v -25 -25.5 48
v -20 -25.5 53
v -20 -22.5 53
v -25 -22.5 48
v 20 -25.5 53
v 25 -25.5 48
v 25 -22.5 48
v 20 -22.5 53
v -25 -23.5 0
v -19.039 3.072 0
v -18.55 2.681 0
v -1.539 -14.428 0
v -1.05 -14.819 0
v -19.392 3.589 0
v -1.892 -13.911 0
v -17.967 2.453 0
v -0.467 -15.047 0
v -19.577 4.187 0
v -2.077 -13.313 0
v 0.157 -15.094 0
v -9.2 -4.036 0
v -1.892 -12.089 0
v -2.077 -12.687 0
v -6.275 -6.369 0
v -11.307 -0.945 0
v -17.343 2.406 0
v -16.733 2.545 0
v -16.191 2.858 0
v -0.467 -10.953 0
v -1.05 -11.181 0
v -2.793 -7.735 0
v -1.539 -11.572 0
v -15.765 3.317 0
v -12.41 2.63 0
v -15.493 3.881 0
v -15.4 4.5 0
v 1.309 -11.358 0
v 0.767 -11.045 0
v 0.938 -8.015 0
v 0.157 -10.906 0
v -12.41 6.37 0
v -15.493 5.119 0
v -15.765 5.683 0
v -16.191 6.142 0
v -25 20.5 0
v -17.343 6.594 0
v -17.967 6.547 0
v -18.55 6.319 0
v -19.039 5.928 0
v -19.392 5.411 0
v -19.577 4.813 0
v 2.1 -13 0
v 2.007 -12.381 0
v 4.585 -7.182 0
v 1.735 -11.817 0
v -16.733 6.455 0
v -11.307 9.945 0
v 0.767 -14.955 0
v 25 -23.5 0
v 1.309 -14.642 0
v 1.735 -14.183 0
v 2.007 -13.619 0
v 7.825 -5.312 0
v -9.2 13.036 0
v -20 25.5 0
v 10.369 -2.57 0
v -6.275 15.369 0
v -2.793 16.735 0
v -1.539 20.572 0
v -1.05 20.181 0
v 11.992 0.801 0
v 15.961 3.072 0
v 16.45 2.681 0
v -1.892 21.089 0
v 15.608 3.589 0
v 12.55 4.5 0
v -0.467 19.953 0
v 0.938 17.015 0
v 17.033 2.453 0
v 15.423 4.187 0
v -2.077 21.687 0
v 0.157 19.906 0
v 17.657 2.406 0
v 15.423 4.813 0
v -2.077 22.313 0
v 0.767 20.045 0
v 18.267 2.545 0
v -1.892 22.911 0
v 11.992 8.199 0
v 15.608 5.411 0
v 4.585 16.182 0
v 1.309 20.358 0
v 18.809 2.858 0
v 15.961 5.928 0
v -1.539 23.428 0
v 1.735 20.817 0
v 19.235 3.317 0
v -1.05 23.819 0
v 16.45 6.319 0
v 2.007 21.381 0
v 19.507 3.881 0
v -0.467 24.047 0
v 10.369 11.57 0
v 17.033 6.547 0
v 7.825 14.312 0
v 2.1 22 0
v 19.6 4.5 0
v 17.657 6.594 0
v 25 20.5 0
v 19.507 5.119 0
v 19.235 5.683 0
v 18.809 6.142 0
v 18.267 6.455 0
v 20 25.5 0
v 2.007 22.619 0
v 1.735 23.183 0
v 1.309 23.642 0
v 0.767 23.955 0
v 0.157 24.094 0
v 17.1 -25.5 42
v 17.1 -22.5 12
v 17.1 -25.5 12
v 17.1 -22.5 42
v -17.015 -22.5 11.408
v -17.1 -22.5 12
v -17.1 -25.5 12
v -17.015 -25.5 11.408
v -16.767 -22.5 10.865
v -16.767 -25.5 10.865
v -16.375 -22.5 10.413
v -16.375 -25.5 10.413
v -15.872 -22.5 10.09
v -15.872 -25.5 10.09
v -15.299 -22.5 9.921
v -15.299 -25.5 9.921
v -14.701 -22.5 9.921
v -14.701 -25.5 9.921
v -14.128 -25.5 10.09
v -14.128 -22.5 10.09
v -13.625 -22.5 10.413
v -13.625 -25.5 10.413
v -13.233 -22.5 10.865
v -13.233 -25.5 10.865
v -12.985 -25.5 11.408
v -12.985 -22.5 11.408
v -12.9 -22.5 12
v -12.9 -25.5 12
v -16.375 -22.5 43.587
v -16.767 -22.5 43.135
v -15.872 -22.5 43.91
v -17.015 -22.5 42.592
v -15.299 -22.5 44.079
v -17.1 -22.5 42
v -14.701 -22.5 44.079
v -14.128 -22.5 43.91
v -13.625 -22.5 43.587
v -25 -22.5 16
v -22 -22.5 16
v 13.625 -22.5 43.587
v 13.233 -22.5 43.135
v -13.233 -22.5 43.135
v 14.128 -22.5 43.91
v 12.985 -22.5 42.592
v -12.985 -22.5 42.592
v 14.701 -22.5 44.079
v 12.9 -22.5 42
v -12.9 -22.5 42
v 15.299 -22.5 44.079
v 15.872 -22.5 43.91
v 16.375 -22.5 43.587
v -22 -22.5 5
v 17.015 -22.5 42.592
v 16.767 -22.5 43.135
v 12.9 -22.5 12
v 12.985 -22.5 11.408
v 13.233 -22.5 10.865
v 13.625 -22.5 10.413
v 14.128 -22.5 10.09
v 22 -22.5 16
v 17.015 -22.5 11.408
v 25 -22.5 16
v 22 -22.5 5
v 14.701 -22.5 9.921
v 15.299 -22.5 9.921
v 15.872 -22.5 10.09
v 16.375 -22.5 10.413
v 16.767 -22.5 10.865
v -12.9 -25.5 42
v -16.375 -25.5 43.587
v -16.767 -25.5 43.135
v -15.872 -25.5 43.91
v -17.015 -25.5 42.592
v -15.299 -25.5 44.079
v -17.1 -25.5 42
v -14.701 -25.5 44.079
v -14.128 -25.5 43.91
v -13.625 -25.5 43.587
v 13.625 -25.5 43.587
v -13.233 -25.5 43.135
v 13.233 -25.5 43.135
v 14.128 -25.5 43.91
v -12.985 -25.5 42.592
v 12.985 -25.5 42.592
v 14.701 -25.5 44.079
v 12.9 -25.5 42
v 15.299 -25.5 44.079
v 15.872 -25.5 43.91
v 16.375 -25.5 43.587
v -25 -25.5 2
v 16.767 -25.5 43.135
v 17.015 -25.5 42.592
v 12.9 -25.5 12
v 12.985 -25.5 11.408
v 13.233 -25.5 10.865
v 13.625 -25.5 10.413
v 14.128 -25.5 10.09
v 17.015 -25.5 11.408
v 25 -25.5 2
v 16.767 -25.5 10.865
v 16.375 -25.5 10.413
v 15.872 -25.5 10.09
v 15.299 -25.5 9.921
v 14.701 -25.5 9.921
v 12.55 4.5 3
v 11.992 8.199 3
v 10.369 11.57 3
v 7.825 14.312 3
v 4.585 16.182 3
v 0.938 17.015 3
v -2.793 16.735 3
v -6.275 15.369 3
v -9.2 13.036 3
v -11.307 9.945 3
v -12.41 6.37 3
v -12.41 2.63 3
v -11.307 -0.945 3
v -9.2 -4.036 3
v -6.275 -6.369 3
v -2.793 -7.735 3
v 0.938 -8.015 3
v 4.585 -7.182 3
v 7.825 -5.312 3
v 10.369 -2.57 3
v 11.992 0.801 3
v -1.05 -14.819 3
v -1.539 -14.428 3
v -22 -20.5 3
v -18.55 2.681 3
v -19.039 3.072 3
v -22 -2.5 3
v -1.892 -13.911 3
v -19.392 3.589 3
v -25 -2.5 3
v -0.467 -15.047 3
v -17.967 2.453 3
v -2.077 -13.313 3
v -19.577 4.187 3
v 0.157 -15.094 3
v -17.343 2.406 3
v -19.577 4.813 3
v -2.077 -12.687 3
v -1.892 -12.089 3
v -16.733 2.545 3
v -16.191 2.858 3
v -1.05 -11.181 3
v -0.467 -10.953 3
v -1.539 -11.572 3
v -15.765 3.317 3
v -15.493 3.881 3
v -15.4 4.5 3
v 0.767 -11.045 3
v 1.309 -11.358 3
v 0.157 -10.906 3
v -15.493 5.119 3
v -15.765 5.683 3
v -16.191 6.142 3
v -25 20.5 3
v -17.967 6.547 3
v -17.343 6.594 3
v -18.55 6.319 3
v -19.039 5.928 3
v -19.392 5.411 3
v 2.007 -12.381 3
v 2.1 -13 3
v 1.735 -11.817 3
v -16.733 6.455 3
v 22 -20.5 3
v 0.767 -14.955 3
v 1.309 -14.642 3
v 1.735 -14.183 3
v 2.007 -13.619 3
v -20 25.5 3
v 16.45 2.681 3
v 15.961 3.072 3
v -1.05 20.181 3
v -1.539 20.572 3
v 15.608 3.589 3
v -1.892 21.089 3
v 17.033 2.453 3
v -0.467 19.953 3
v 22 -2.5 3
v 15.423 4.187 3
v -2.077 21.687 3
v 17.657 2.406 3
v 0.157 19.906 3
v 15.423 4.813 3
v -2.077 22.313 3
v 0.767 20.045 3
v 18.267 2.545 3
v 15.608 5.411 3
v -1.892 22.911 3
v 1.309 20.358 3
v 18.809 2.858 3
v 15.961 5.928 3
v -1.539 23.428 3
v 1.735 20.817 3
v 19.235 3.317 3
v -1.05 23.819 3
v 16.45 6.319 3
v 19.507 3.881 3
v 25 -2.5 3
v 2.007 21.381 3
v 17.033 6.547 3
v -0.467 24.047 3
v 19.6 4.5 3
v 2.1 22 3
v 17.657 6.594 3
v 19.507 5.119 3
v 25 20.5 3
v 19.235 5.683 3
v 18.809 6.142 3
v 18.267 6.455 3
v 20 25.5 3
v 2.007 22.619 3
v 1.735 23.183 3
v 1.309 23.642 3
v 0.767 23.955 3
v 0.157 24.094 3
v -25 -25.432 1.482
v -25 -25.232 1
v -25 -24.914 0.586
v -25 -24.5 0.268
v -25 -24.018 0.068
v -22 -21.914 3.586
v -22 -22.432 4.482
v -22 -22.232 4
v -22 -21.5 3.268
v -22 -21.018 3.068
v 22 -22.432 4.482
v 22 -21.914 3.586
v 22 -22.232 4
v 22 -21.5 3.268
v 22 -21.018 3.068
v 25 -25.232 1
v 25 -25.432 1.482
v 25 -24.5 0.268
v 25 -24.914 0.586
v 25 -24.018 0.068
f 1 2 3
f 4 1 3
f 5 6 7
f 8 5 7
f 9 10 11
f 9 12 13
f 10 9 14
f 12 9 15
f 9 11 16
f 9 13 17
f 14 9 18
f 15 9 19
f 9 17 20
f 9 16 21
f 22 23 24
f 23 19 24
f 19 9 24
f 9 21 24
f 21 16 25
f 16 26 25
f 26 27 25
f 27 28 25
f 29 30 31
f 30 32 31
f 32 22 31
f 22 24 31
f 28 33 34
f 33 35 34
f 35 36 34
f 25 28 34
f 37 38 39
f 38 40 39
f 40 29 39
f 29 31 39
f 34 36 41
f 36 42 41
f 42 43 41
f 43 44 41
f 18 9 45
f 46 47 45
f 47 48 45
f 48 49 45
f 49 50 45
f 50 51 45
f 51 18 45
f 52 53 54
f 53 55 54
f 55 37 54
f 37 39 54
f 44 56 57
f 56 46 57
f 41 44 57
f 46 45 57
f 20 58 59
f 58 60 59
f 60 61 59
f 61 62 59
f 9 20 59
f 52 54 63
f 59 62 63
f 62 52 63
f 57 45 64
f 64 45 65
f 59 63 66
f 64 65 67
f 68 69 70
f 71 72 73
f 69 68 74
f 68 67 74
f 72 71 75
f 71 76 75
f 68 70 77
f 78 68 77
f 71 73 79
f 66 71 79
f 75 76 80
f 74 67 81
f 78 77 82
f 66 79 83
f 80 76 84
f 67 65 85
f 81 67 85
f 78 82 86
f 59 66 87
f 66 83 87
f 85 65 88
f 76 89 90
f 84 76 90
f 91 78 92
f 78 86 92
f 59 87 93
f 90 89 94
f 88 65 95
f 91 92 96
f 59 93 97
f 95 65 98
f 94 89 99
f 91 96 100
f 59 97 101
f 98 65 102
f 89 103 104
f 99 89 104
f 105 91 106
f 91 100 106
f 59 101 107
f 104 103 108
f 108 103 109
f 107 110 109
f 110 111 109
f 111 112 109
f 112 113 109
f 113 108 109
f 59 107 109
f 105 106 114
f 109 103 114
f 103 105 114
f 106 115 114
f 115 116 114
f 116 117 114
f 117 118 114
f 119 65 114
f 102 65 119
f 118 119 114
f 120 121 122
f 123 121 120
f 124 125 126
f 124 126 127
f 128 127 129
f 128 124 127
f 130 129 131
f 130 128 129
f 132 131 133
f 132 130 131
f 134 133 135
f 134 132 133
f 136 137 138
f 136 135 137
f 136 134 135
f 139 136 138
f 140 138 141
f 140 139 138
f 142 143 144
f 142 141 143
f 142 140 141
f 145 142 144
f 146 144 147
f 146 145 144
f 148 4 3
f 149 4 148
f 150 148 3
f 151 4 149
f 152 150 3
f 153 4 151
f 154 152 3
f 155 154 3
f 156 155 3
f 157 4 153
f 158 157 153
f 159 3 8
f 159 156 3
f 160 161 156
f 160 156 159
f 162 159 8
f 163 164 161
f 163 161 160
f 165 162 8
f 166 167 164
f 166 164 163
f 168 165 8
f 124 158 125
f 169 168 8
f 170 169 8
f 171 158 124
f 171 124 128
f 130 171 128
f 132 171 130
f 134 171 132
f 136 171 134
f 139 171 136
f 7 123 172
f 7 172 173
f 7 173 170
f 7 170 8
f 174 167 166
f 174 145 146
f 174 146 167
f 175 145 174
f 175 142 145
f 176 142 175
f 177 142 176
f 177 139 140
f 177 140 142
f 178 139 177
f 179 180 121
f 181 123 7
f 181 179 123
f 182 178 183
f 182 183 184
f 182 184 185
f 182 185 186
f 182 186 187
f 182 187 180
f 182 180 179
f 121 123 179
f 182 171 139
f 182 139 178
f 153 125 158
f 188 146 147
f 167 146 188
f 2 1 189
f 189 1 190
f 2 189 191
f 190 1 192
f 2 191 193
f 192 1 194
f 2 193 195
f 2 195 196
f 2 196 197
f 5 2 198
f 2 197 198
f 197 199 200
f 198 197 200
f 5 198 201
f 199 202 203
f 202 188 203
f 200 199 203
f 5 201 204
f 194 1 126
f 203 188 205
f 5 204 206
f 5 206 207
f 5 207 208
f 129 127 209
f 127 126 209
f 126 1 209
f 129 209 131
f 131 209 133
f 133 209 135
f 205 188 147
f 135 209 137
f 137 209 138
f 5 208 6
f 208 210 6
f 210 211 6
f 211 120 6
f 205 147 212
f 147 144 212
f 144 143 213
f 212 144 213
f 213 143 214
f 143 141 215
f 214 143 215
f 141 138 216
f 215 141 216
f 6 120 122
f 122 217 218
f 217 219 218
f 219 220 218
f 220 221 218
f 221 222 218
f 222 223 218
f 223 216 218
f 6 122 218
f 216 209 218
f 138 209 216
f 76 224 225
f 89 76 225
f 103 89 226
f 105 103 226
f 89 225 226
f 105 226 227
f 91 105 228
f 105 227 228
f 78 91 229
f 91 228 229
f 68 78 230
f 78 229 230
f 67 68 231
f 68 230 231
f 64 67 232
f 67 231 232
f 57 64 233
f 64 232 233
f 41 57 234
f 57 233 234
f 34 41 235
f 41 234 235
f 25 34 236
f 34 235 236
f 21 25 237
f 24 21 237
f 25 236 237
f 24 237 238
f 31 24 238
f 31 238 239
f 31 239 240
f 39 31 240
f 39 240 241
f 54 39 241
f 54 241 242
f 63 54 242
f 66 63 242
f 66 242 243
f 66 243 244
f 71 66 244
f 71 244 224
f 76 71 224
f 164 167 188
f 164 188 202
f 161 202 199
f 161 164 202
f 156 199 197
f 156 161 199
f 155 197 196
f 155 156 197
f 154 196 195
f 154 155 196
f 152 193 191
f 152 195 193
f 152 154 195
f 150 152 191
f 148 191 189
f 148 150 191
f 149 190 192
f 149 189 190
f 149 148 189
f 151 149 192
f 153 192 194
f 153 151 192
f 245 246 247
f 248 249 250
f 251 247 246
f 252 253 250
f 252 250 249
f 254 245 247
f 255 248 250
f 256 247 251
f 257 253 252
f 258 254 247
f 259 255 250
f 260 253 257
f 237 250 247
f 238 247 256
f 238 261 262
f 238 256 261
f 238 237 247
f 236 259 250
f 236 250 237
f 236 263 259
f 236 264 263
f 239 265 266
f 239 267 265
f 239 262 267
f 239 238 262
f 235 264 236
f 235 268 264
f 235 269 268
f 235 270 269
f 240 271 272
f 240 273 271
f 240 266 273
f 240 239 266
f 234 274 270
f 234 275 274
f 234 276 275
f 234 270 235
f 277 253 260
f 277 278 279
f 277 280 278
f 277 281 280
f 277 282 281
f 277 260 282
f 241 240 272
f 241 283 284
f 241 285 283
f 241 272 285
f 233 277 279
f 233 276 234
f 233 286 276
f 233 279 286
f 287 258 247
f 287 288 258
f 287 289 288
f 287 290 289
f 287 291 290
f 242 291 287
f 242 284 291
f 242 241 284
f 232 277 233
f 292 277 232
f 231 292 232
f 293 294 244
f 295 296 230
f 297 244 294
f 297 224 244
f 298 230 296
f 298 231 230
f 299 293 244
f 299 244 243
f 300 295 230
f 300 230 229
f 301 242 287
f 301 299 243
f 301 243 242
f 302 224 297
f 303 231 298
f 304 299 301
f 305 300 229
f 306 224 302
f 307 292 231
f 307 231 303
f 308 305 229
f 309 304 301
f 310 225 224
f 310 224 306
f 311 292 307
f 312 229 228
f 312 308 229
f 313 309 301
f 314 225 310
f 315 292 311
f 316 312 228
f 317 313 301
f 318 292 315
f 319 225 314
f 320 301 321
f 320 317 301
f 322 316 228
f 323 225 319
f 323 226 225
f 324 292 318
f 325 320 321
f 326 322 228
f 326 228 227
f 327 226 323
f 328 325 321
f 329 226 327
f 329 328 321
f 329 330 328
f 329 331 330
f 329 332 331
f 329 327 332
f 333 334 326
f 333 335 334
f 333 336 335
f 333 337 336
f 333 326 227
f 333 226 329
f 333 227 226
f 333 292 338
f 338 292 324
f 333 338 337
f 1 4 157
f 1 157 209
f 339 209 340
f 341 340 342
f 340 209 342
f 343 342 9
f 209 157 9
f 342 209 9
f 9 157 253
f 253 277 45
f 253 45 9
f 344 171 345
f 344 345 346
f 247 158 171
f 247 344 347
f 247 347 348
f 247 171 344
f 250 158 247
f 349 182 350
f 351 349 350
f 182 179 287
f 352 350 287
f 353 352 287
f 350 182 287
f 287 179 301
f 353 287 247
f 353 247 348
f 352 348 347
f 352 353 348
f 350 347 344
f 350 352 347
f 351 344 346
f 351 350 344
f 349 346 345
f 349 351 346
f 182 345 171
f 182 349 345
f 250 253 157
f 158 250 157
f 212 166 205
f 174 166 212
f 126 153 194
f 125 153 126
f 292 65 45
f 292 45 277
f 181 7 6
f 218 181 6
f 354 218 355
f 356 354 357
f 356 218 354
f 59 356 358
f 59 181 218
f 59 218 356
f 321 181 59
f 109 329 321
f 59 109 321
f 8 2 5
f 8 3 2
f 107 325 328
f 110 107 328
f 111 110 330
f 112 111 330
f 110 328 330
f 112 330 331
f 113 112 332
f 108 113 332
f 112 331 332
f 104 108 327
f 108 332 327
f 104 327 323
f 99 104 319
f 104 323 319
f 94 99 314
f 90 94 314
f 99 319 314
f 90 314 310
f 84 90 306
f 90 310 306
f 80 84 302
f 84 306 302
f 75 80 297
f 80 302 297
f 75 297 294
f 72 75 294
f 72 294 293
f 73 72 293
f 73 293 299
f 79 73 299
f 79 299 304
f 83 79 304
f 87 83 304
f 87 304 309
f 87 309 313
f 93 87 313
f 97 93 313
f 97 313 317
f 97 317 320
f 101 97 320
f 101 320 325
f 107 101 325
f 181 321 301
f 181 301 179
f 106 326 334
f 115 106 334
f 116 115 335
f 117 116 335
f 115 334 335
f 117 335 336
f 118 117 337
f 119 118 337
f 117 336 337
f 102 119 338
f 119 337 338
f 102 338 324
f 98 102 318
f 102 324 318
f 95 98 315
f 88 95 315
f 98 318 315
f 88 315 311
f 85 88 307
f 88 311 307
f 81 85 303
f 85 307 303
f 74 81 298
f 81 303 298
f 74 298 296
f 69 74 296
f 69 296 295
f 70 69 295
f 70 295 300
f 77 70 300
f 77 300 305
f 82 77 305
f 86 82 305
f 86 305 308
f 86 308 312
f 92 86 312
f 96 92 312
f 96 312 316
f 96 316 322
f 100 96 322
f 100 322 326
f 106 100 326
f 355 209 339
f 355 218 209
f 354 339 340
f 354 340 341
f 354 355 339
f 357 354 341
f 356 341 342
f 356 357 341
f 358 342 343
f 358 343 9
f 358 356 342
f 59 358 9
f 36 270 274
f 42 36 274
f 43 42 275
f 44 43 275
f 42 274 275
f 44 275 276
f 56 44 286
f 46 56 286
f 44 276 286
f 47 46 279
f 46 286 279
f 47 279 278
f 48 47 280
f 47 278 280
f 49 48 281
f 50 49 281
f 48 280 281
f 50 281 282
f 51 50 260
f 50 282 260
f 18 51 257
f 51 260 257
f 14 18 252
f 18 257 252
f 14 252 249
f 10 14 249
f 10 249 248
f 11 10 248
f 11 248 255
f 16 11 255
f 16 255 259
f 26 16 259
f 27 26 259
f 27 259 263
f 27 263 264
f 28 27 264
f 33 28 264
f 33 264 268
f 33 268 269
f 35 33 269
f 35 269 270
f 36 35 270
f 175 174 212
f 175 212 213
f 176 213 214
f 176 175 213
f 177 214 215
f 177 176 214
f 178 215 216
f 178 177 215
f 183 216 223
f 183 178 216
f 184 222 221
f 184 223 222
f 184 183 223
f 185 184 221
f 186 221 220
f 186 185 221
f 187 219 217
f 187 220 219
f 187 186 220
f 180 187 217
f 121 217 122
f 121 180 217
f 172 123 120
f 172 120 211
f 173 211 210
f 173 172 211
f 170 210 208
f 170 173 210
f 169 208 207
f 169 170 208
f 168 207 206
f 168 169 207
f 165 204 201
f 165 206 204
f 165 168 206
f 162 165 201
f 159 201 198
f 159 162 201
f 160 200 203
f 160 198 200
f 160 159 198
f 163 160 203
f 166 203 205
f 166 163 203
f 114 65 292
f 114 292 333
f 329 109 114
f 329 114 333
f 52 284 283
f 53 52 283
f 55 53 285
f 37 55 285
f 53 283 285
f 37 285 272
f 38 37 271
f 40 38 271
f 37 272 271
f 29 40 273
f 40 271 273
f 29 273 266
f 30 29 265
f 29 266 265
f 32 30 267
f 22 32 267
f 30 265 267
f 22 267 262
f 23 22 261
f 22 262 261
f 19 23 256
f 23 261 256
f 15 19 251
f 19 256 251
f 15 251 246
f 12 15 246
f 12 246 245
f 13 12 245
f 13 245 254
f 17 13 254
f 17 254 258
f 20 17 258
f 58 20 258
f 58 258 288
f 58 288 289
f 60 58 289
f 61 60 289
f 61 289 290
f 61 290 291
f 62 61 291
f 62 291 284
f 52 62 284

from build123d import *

# Parameters (mm, degrees)
SKETCH1_W           = 50
SKETCH1_H           = 51
BOSS_EXTRUDE1_DEPTH = 3
SKETCH2_W           = 50
SKETCH2_H           = 3
BOSS_EXTRUDE2_DEPTH = 50
FILLET1_R           = 2
CHAMFER1_SIZE       = 5
CUT_EXTRUDE1_DEPTH  = 50
SKETCH4_R           = 12.55
SKETCH4_R_2         = 2.1
CUT_EXTRUDE2_DEPTH  = 50
BOSS_EXTRUDE3_DEPTH = 3


with BuildPart() as part:
    # Sketch1 → Boss-Extrude1 (new body)
    with BuildSketch(Plane.XY):
        Rectangle(SKETCH1_W, SKETCH1_H)
    extrude(amount=BOSS_EXTRUDE1_DEPTH)

    # Sketch2 → Boss-Extrude2 (add)
    with BuildSketch(Plane.XY.offset(3)):
        with Locations((0, -24)):
            Rectangle(SKETCH2_W, SKETCH2_H)
    extrude(amount=BOSS_EXTRUDE2_DEPTH)

    # Fillet1
    fillet1_edges = [part.edges().sort_by_distance(p)[0] for p in [
        (0, -22.5, 3),
        (0, -25.5, 0),
    ]]
    fillet(fillet1_edges, radius=FILLET1_R)

    # Chamfer1
    chamfer1_edges = [part.edges().sort_by_distance(p)[0] for p in [
        (-25, -24, 53),
        (25, -24, 53),
        (-25, 25.5, 1.5),
        (25, 25.5, 1.5),
    ]]
    chamfer(chamfer1_edges, length=CHAMFER1_SIZE)

    # Sketch3 → Cut-Extrude1 (cut)
    with BuildSketch(Plane(origin=(0, -22.5, 0), x_dir=(1, 0, 0), z_dir=(0, 1, 0))):
        with BuildLine():
            Line((-17.1, -42), (-17.1, -12))
            ThreePointArc((-17.1, -12), (-15, -9.9), (-12.9, -12))
            Line((-12.9, -12), (-12.9, -42))
            ThreePointArc((-12.9, -42), (-15, -44.1), (-17.1, -42))
        make_face()
        with BuildLine():
            Line((12.9, -42), (12.9, -12))
            ThreePointArc((12.9, -12), (15, -9.9), (17.1, -12))
            Line((17.1, -12), (17.1, -42))
            ThreePointArc((17.1, -42), (15, -44.1), (12.9, -42))
        make_face()
    extrude(amount=-CUT_EXTRUDE1_DEPTH, mode=Mode.SUBTRACT)

    # Sketch4 → Cut-Extrude2 (cut)
    with BuildSketch(Plane.XY.offset(3)):
        with Locations((0, 4.5)):
            Circle(SKETCH4_R)
        with Locations((0, 22)):
            Circle(SKETCH4_R_2)
        with Locations((0, -13)):
            Circle(SKETCH4_R_2)
        with Locations((17.5, 4.5)):
            Circle(SKETCH4_R_2)
        with Locations((-17.5, 4.5)):
            Circle(SKETCH4_R_2)
    extrude(amount=-CUT_EXTRUDE2_DEPTH, mode=Mode.SUBTRACT)

    # Sketch5 → Boss-Extrude3 (add)
    with BuildSketch(Plane.ZY.offset(25)):
        with BuildLine():
            Line((3, -2.5), (16, -22.5))
            Line((16, -22.5), (5, -22.5))
            ThreePointArc((5, -22.5), (3.585786438, -21.914213562), (3, -20.5))
            Line((3, -20.5), (3, -2.5))
        make_face()
    boss_extrude3 = extrude(amount=-BOSS_EXTRUDE3_DEPTH)

    # Mirror1: Boss-Extrude3 across plane
    add(boss_extrude3.mirror(Plane(origin=(0, 0, 0), x_dir=(0, 0, 1), z_dir=(1, 0, 0))))


solid = part.part
